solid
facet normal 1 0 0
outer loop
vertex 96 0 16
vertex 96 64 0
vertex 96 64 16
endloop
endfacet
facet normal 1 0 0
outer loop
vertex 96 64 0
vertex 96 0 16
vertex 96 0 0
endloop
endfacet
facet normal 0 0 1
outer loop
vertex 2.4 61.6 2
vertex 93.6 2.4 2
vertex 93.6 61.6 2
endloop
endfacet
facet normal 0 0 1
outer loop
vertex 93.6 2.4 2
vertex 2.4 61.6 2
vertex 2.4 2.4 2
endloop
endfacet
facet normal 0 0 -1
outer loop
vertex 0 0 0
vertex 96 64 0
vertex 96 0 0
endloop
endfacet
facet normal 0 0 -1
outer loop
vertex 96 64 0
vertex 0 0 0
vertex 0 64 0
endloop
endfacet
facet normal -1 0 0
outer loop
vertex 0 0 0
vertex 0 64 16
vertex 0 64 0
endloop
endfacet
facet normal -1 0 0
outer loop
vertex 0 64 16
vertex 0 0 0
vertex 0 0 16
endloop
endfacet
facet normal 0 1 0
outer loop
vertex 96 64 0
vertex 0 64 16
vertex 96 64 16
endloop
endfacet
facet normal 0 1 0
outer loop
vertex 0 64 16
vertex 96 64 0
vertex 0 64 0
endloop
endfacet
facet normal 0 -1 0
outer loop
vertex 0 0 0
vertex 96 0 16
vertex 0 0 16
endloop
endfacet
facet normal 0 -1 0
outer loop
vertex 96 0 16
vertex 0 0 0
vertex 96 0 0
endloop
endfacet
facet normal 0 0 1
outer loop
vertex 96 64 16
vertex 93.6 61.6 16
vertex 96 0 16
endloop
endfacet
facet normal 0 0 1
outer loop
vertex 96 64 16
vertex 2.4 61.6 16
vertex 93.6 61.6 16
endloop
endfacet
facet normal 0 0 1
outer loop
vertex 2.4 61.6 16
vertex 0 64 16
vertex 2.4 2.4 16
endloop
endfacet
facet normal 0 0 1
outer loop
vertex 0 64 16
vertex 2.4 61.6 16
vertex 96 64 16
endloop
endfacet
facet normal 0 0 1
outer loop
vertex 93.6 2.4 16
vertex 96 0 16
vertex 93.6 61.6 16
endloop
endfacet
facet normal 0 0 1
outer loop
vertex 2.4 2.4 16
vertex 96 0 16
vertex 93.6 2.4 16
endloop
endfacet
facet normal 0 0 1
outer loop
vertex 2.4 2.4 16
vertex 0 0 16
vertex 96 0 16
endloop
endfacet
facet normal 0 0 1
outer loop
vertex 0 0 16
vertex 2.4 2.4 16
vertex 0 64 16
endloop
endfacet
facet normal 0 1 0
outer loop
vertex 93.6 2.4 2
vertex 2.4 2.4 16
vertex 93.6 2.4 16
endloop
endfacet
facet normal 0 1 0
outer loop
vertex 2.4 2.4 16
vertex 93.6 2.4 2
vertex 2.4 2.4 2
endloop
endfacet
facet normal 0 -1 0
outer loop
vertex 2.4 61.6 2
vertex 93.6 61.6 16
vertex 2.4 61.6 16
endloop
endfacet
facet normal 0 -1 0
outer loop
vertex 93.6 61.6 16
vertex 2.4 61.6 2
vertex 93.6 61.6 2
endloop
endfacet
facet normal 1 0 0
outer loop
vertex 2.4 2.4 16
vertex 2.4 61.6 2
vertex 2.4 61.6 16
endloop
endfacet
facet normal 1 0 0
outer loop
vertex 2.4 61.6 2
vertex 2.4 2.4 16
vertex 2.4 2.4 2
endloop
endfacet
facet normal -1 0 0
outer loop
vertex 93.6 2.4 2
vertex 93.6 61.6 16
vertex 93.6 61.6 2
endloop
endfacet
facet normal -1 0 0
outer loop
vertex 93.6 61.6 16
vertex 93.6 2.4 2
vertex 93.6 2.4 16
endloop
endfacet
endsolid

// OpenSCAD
// SPDX-License-Identifier: CC-BY-4.0
// Original design: OpenPrintLab contributors. Units: mm.
// Generated inspection snapshot; edit models/recipes.py and catalog.json to customize.
// https://github.com/Prashanth261993/OpenPrintLab
union() {
  translate([0.000000, 0.000000, 0.000000]) cube([96.000000, 64.000000, 2.000000]);
  translate([0.000000, 0.000000, 2.000000]) cube([96.000000, 2.400000, 14.000000]);
  translate([0.000000, 61.600000, 2.000000]) cube([96.000000, 2.400000, 14.000000]);
  translate([0.000000, 2.400000, 2.000000]) cube([2.400000, 59.200000, 14.000000]);
  translate([93.600000, 2.400000, 2.000000]) cube([2.400000, 59.200000, 14.000000]);
}
